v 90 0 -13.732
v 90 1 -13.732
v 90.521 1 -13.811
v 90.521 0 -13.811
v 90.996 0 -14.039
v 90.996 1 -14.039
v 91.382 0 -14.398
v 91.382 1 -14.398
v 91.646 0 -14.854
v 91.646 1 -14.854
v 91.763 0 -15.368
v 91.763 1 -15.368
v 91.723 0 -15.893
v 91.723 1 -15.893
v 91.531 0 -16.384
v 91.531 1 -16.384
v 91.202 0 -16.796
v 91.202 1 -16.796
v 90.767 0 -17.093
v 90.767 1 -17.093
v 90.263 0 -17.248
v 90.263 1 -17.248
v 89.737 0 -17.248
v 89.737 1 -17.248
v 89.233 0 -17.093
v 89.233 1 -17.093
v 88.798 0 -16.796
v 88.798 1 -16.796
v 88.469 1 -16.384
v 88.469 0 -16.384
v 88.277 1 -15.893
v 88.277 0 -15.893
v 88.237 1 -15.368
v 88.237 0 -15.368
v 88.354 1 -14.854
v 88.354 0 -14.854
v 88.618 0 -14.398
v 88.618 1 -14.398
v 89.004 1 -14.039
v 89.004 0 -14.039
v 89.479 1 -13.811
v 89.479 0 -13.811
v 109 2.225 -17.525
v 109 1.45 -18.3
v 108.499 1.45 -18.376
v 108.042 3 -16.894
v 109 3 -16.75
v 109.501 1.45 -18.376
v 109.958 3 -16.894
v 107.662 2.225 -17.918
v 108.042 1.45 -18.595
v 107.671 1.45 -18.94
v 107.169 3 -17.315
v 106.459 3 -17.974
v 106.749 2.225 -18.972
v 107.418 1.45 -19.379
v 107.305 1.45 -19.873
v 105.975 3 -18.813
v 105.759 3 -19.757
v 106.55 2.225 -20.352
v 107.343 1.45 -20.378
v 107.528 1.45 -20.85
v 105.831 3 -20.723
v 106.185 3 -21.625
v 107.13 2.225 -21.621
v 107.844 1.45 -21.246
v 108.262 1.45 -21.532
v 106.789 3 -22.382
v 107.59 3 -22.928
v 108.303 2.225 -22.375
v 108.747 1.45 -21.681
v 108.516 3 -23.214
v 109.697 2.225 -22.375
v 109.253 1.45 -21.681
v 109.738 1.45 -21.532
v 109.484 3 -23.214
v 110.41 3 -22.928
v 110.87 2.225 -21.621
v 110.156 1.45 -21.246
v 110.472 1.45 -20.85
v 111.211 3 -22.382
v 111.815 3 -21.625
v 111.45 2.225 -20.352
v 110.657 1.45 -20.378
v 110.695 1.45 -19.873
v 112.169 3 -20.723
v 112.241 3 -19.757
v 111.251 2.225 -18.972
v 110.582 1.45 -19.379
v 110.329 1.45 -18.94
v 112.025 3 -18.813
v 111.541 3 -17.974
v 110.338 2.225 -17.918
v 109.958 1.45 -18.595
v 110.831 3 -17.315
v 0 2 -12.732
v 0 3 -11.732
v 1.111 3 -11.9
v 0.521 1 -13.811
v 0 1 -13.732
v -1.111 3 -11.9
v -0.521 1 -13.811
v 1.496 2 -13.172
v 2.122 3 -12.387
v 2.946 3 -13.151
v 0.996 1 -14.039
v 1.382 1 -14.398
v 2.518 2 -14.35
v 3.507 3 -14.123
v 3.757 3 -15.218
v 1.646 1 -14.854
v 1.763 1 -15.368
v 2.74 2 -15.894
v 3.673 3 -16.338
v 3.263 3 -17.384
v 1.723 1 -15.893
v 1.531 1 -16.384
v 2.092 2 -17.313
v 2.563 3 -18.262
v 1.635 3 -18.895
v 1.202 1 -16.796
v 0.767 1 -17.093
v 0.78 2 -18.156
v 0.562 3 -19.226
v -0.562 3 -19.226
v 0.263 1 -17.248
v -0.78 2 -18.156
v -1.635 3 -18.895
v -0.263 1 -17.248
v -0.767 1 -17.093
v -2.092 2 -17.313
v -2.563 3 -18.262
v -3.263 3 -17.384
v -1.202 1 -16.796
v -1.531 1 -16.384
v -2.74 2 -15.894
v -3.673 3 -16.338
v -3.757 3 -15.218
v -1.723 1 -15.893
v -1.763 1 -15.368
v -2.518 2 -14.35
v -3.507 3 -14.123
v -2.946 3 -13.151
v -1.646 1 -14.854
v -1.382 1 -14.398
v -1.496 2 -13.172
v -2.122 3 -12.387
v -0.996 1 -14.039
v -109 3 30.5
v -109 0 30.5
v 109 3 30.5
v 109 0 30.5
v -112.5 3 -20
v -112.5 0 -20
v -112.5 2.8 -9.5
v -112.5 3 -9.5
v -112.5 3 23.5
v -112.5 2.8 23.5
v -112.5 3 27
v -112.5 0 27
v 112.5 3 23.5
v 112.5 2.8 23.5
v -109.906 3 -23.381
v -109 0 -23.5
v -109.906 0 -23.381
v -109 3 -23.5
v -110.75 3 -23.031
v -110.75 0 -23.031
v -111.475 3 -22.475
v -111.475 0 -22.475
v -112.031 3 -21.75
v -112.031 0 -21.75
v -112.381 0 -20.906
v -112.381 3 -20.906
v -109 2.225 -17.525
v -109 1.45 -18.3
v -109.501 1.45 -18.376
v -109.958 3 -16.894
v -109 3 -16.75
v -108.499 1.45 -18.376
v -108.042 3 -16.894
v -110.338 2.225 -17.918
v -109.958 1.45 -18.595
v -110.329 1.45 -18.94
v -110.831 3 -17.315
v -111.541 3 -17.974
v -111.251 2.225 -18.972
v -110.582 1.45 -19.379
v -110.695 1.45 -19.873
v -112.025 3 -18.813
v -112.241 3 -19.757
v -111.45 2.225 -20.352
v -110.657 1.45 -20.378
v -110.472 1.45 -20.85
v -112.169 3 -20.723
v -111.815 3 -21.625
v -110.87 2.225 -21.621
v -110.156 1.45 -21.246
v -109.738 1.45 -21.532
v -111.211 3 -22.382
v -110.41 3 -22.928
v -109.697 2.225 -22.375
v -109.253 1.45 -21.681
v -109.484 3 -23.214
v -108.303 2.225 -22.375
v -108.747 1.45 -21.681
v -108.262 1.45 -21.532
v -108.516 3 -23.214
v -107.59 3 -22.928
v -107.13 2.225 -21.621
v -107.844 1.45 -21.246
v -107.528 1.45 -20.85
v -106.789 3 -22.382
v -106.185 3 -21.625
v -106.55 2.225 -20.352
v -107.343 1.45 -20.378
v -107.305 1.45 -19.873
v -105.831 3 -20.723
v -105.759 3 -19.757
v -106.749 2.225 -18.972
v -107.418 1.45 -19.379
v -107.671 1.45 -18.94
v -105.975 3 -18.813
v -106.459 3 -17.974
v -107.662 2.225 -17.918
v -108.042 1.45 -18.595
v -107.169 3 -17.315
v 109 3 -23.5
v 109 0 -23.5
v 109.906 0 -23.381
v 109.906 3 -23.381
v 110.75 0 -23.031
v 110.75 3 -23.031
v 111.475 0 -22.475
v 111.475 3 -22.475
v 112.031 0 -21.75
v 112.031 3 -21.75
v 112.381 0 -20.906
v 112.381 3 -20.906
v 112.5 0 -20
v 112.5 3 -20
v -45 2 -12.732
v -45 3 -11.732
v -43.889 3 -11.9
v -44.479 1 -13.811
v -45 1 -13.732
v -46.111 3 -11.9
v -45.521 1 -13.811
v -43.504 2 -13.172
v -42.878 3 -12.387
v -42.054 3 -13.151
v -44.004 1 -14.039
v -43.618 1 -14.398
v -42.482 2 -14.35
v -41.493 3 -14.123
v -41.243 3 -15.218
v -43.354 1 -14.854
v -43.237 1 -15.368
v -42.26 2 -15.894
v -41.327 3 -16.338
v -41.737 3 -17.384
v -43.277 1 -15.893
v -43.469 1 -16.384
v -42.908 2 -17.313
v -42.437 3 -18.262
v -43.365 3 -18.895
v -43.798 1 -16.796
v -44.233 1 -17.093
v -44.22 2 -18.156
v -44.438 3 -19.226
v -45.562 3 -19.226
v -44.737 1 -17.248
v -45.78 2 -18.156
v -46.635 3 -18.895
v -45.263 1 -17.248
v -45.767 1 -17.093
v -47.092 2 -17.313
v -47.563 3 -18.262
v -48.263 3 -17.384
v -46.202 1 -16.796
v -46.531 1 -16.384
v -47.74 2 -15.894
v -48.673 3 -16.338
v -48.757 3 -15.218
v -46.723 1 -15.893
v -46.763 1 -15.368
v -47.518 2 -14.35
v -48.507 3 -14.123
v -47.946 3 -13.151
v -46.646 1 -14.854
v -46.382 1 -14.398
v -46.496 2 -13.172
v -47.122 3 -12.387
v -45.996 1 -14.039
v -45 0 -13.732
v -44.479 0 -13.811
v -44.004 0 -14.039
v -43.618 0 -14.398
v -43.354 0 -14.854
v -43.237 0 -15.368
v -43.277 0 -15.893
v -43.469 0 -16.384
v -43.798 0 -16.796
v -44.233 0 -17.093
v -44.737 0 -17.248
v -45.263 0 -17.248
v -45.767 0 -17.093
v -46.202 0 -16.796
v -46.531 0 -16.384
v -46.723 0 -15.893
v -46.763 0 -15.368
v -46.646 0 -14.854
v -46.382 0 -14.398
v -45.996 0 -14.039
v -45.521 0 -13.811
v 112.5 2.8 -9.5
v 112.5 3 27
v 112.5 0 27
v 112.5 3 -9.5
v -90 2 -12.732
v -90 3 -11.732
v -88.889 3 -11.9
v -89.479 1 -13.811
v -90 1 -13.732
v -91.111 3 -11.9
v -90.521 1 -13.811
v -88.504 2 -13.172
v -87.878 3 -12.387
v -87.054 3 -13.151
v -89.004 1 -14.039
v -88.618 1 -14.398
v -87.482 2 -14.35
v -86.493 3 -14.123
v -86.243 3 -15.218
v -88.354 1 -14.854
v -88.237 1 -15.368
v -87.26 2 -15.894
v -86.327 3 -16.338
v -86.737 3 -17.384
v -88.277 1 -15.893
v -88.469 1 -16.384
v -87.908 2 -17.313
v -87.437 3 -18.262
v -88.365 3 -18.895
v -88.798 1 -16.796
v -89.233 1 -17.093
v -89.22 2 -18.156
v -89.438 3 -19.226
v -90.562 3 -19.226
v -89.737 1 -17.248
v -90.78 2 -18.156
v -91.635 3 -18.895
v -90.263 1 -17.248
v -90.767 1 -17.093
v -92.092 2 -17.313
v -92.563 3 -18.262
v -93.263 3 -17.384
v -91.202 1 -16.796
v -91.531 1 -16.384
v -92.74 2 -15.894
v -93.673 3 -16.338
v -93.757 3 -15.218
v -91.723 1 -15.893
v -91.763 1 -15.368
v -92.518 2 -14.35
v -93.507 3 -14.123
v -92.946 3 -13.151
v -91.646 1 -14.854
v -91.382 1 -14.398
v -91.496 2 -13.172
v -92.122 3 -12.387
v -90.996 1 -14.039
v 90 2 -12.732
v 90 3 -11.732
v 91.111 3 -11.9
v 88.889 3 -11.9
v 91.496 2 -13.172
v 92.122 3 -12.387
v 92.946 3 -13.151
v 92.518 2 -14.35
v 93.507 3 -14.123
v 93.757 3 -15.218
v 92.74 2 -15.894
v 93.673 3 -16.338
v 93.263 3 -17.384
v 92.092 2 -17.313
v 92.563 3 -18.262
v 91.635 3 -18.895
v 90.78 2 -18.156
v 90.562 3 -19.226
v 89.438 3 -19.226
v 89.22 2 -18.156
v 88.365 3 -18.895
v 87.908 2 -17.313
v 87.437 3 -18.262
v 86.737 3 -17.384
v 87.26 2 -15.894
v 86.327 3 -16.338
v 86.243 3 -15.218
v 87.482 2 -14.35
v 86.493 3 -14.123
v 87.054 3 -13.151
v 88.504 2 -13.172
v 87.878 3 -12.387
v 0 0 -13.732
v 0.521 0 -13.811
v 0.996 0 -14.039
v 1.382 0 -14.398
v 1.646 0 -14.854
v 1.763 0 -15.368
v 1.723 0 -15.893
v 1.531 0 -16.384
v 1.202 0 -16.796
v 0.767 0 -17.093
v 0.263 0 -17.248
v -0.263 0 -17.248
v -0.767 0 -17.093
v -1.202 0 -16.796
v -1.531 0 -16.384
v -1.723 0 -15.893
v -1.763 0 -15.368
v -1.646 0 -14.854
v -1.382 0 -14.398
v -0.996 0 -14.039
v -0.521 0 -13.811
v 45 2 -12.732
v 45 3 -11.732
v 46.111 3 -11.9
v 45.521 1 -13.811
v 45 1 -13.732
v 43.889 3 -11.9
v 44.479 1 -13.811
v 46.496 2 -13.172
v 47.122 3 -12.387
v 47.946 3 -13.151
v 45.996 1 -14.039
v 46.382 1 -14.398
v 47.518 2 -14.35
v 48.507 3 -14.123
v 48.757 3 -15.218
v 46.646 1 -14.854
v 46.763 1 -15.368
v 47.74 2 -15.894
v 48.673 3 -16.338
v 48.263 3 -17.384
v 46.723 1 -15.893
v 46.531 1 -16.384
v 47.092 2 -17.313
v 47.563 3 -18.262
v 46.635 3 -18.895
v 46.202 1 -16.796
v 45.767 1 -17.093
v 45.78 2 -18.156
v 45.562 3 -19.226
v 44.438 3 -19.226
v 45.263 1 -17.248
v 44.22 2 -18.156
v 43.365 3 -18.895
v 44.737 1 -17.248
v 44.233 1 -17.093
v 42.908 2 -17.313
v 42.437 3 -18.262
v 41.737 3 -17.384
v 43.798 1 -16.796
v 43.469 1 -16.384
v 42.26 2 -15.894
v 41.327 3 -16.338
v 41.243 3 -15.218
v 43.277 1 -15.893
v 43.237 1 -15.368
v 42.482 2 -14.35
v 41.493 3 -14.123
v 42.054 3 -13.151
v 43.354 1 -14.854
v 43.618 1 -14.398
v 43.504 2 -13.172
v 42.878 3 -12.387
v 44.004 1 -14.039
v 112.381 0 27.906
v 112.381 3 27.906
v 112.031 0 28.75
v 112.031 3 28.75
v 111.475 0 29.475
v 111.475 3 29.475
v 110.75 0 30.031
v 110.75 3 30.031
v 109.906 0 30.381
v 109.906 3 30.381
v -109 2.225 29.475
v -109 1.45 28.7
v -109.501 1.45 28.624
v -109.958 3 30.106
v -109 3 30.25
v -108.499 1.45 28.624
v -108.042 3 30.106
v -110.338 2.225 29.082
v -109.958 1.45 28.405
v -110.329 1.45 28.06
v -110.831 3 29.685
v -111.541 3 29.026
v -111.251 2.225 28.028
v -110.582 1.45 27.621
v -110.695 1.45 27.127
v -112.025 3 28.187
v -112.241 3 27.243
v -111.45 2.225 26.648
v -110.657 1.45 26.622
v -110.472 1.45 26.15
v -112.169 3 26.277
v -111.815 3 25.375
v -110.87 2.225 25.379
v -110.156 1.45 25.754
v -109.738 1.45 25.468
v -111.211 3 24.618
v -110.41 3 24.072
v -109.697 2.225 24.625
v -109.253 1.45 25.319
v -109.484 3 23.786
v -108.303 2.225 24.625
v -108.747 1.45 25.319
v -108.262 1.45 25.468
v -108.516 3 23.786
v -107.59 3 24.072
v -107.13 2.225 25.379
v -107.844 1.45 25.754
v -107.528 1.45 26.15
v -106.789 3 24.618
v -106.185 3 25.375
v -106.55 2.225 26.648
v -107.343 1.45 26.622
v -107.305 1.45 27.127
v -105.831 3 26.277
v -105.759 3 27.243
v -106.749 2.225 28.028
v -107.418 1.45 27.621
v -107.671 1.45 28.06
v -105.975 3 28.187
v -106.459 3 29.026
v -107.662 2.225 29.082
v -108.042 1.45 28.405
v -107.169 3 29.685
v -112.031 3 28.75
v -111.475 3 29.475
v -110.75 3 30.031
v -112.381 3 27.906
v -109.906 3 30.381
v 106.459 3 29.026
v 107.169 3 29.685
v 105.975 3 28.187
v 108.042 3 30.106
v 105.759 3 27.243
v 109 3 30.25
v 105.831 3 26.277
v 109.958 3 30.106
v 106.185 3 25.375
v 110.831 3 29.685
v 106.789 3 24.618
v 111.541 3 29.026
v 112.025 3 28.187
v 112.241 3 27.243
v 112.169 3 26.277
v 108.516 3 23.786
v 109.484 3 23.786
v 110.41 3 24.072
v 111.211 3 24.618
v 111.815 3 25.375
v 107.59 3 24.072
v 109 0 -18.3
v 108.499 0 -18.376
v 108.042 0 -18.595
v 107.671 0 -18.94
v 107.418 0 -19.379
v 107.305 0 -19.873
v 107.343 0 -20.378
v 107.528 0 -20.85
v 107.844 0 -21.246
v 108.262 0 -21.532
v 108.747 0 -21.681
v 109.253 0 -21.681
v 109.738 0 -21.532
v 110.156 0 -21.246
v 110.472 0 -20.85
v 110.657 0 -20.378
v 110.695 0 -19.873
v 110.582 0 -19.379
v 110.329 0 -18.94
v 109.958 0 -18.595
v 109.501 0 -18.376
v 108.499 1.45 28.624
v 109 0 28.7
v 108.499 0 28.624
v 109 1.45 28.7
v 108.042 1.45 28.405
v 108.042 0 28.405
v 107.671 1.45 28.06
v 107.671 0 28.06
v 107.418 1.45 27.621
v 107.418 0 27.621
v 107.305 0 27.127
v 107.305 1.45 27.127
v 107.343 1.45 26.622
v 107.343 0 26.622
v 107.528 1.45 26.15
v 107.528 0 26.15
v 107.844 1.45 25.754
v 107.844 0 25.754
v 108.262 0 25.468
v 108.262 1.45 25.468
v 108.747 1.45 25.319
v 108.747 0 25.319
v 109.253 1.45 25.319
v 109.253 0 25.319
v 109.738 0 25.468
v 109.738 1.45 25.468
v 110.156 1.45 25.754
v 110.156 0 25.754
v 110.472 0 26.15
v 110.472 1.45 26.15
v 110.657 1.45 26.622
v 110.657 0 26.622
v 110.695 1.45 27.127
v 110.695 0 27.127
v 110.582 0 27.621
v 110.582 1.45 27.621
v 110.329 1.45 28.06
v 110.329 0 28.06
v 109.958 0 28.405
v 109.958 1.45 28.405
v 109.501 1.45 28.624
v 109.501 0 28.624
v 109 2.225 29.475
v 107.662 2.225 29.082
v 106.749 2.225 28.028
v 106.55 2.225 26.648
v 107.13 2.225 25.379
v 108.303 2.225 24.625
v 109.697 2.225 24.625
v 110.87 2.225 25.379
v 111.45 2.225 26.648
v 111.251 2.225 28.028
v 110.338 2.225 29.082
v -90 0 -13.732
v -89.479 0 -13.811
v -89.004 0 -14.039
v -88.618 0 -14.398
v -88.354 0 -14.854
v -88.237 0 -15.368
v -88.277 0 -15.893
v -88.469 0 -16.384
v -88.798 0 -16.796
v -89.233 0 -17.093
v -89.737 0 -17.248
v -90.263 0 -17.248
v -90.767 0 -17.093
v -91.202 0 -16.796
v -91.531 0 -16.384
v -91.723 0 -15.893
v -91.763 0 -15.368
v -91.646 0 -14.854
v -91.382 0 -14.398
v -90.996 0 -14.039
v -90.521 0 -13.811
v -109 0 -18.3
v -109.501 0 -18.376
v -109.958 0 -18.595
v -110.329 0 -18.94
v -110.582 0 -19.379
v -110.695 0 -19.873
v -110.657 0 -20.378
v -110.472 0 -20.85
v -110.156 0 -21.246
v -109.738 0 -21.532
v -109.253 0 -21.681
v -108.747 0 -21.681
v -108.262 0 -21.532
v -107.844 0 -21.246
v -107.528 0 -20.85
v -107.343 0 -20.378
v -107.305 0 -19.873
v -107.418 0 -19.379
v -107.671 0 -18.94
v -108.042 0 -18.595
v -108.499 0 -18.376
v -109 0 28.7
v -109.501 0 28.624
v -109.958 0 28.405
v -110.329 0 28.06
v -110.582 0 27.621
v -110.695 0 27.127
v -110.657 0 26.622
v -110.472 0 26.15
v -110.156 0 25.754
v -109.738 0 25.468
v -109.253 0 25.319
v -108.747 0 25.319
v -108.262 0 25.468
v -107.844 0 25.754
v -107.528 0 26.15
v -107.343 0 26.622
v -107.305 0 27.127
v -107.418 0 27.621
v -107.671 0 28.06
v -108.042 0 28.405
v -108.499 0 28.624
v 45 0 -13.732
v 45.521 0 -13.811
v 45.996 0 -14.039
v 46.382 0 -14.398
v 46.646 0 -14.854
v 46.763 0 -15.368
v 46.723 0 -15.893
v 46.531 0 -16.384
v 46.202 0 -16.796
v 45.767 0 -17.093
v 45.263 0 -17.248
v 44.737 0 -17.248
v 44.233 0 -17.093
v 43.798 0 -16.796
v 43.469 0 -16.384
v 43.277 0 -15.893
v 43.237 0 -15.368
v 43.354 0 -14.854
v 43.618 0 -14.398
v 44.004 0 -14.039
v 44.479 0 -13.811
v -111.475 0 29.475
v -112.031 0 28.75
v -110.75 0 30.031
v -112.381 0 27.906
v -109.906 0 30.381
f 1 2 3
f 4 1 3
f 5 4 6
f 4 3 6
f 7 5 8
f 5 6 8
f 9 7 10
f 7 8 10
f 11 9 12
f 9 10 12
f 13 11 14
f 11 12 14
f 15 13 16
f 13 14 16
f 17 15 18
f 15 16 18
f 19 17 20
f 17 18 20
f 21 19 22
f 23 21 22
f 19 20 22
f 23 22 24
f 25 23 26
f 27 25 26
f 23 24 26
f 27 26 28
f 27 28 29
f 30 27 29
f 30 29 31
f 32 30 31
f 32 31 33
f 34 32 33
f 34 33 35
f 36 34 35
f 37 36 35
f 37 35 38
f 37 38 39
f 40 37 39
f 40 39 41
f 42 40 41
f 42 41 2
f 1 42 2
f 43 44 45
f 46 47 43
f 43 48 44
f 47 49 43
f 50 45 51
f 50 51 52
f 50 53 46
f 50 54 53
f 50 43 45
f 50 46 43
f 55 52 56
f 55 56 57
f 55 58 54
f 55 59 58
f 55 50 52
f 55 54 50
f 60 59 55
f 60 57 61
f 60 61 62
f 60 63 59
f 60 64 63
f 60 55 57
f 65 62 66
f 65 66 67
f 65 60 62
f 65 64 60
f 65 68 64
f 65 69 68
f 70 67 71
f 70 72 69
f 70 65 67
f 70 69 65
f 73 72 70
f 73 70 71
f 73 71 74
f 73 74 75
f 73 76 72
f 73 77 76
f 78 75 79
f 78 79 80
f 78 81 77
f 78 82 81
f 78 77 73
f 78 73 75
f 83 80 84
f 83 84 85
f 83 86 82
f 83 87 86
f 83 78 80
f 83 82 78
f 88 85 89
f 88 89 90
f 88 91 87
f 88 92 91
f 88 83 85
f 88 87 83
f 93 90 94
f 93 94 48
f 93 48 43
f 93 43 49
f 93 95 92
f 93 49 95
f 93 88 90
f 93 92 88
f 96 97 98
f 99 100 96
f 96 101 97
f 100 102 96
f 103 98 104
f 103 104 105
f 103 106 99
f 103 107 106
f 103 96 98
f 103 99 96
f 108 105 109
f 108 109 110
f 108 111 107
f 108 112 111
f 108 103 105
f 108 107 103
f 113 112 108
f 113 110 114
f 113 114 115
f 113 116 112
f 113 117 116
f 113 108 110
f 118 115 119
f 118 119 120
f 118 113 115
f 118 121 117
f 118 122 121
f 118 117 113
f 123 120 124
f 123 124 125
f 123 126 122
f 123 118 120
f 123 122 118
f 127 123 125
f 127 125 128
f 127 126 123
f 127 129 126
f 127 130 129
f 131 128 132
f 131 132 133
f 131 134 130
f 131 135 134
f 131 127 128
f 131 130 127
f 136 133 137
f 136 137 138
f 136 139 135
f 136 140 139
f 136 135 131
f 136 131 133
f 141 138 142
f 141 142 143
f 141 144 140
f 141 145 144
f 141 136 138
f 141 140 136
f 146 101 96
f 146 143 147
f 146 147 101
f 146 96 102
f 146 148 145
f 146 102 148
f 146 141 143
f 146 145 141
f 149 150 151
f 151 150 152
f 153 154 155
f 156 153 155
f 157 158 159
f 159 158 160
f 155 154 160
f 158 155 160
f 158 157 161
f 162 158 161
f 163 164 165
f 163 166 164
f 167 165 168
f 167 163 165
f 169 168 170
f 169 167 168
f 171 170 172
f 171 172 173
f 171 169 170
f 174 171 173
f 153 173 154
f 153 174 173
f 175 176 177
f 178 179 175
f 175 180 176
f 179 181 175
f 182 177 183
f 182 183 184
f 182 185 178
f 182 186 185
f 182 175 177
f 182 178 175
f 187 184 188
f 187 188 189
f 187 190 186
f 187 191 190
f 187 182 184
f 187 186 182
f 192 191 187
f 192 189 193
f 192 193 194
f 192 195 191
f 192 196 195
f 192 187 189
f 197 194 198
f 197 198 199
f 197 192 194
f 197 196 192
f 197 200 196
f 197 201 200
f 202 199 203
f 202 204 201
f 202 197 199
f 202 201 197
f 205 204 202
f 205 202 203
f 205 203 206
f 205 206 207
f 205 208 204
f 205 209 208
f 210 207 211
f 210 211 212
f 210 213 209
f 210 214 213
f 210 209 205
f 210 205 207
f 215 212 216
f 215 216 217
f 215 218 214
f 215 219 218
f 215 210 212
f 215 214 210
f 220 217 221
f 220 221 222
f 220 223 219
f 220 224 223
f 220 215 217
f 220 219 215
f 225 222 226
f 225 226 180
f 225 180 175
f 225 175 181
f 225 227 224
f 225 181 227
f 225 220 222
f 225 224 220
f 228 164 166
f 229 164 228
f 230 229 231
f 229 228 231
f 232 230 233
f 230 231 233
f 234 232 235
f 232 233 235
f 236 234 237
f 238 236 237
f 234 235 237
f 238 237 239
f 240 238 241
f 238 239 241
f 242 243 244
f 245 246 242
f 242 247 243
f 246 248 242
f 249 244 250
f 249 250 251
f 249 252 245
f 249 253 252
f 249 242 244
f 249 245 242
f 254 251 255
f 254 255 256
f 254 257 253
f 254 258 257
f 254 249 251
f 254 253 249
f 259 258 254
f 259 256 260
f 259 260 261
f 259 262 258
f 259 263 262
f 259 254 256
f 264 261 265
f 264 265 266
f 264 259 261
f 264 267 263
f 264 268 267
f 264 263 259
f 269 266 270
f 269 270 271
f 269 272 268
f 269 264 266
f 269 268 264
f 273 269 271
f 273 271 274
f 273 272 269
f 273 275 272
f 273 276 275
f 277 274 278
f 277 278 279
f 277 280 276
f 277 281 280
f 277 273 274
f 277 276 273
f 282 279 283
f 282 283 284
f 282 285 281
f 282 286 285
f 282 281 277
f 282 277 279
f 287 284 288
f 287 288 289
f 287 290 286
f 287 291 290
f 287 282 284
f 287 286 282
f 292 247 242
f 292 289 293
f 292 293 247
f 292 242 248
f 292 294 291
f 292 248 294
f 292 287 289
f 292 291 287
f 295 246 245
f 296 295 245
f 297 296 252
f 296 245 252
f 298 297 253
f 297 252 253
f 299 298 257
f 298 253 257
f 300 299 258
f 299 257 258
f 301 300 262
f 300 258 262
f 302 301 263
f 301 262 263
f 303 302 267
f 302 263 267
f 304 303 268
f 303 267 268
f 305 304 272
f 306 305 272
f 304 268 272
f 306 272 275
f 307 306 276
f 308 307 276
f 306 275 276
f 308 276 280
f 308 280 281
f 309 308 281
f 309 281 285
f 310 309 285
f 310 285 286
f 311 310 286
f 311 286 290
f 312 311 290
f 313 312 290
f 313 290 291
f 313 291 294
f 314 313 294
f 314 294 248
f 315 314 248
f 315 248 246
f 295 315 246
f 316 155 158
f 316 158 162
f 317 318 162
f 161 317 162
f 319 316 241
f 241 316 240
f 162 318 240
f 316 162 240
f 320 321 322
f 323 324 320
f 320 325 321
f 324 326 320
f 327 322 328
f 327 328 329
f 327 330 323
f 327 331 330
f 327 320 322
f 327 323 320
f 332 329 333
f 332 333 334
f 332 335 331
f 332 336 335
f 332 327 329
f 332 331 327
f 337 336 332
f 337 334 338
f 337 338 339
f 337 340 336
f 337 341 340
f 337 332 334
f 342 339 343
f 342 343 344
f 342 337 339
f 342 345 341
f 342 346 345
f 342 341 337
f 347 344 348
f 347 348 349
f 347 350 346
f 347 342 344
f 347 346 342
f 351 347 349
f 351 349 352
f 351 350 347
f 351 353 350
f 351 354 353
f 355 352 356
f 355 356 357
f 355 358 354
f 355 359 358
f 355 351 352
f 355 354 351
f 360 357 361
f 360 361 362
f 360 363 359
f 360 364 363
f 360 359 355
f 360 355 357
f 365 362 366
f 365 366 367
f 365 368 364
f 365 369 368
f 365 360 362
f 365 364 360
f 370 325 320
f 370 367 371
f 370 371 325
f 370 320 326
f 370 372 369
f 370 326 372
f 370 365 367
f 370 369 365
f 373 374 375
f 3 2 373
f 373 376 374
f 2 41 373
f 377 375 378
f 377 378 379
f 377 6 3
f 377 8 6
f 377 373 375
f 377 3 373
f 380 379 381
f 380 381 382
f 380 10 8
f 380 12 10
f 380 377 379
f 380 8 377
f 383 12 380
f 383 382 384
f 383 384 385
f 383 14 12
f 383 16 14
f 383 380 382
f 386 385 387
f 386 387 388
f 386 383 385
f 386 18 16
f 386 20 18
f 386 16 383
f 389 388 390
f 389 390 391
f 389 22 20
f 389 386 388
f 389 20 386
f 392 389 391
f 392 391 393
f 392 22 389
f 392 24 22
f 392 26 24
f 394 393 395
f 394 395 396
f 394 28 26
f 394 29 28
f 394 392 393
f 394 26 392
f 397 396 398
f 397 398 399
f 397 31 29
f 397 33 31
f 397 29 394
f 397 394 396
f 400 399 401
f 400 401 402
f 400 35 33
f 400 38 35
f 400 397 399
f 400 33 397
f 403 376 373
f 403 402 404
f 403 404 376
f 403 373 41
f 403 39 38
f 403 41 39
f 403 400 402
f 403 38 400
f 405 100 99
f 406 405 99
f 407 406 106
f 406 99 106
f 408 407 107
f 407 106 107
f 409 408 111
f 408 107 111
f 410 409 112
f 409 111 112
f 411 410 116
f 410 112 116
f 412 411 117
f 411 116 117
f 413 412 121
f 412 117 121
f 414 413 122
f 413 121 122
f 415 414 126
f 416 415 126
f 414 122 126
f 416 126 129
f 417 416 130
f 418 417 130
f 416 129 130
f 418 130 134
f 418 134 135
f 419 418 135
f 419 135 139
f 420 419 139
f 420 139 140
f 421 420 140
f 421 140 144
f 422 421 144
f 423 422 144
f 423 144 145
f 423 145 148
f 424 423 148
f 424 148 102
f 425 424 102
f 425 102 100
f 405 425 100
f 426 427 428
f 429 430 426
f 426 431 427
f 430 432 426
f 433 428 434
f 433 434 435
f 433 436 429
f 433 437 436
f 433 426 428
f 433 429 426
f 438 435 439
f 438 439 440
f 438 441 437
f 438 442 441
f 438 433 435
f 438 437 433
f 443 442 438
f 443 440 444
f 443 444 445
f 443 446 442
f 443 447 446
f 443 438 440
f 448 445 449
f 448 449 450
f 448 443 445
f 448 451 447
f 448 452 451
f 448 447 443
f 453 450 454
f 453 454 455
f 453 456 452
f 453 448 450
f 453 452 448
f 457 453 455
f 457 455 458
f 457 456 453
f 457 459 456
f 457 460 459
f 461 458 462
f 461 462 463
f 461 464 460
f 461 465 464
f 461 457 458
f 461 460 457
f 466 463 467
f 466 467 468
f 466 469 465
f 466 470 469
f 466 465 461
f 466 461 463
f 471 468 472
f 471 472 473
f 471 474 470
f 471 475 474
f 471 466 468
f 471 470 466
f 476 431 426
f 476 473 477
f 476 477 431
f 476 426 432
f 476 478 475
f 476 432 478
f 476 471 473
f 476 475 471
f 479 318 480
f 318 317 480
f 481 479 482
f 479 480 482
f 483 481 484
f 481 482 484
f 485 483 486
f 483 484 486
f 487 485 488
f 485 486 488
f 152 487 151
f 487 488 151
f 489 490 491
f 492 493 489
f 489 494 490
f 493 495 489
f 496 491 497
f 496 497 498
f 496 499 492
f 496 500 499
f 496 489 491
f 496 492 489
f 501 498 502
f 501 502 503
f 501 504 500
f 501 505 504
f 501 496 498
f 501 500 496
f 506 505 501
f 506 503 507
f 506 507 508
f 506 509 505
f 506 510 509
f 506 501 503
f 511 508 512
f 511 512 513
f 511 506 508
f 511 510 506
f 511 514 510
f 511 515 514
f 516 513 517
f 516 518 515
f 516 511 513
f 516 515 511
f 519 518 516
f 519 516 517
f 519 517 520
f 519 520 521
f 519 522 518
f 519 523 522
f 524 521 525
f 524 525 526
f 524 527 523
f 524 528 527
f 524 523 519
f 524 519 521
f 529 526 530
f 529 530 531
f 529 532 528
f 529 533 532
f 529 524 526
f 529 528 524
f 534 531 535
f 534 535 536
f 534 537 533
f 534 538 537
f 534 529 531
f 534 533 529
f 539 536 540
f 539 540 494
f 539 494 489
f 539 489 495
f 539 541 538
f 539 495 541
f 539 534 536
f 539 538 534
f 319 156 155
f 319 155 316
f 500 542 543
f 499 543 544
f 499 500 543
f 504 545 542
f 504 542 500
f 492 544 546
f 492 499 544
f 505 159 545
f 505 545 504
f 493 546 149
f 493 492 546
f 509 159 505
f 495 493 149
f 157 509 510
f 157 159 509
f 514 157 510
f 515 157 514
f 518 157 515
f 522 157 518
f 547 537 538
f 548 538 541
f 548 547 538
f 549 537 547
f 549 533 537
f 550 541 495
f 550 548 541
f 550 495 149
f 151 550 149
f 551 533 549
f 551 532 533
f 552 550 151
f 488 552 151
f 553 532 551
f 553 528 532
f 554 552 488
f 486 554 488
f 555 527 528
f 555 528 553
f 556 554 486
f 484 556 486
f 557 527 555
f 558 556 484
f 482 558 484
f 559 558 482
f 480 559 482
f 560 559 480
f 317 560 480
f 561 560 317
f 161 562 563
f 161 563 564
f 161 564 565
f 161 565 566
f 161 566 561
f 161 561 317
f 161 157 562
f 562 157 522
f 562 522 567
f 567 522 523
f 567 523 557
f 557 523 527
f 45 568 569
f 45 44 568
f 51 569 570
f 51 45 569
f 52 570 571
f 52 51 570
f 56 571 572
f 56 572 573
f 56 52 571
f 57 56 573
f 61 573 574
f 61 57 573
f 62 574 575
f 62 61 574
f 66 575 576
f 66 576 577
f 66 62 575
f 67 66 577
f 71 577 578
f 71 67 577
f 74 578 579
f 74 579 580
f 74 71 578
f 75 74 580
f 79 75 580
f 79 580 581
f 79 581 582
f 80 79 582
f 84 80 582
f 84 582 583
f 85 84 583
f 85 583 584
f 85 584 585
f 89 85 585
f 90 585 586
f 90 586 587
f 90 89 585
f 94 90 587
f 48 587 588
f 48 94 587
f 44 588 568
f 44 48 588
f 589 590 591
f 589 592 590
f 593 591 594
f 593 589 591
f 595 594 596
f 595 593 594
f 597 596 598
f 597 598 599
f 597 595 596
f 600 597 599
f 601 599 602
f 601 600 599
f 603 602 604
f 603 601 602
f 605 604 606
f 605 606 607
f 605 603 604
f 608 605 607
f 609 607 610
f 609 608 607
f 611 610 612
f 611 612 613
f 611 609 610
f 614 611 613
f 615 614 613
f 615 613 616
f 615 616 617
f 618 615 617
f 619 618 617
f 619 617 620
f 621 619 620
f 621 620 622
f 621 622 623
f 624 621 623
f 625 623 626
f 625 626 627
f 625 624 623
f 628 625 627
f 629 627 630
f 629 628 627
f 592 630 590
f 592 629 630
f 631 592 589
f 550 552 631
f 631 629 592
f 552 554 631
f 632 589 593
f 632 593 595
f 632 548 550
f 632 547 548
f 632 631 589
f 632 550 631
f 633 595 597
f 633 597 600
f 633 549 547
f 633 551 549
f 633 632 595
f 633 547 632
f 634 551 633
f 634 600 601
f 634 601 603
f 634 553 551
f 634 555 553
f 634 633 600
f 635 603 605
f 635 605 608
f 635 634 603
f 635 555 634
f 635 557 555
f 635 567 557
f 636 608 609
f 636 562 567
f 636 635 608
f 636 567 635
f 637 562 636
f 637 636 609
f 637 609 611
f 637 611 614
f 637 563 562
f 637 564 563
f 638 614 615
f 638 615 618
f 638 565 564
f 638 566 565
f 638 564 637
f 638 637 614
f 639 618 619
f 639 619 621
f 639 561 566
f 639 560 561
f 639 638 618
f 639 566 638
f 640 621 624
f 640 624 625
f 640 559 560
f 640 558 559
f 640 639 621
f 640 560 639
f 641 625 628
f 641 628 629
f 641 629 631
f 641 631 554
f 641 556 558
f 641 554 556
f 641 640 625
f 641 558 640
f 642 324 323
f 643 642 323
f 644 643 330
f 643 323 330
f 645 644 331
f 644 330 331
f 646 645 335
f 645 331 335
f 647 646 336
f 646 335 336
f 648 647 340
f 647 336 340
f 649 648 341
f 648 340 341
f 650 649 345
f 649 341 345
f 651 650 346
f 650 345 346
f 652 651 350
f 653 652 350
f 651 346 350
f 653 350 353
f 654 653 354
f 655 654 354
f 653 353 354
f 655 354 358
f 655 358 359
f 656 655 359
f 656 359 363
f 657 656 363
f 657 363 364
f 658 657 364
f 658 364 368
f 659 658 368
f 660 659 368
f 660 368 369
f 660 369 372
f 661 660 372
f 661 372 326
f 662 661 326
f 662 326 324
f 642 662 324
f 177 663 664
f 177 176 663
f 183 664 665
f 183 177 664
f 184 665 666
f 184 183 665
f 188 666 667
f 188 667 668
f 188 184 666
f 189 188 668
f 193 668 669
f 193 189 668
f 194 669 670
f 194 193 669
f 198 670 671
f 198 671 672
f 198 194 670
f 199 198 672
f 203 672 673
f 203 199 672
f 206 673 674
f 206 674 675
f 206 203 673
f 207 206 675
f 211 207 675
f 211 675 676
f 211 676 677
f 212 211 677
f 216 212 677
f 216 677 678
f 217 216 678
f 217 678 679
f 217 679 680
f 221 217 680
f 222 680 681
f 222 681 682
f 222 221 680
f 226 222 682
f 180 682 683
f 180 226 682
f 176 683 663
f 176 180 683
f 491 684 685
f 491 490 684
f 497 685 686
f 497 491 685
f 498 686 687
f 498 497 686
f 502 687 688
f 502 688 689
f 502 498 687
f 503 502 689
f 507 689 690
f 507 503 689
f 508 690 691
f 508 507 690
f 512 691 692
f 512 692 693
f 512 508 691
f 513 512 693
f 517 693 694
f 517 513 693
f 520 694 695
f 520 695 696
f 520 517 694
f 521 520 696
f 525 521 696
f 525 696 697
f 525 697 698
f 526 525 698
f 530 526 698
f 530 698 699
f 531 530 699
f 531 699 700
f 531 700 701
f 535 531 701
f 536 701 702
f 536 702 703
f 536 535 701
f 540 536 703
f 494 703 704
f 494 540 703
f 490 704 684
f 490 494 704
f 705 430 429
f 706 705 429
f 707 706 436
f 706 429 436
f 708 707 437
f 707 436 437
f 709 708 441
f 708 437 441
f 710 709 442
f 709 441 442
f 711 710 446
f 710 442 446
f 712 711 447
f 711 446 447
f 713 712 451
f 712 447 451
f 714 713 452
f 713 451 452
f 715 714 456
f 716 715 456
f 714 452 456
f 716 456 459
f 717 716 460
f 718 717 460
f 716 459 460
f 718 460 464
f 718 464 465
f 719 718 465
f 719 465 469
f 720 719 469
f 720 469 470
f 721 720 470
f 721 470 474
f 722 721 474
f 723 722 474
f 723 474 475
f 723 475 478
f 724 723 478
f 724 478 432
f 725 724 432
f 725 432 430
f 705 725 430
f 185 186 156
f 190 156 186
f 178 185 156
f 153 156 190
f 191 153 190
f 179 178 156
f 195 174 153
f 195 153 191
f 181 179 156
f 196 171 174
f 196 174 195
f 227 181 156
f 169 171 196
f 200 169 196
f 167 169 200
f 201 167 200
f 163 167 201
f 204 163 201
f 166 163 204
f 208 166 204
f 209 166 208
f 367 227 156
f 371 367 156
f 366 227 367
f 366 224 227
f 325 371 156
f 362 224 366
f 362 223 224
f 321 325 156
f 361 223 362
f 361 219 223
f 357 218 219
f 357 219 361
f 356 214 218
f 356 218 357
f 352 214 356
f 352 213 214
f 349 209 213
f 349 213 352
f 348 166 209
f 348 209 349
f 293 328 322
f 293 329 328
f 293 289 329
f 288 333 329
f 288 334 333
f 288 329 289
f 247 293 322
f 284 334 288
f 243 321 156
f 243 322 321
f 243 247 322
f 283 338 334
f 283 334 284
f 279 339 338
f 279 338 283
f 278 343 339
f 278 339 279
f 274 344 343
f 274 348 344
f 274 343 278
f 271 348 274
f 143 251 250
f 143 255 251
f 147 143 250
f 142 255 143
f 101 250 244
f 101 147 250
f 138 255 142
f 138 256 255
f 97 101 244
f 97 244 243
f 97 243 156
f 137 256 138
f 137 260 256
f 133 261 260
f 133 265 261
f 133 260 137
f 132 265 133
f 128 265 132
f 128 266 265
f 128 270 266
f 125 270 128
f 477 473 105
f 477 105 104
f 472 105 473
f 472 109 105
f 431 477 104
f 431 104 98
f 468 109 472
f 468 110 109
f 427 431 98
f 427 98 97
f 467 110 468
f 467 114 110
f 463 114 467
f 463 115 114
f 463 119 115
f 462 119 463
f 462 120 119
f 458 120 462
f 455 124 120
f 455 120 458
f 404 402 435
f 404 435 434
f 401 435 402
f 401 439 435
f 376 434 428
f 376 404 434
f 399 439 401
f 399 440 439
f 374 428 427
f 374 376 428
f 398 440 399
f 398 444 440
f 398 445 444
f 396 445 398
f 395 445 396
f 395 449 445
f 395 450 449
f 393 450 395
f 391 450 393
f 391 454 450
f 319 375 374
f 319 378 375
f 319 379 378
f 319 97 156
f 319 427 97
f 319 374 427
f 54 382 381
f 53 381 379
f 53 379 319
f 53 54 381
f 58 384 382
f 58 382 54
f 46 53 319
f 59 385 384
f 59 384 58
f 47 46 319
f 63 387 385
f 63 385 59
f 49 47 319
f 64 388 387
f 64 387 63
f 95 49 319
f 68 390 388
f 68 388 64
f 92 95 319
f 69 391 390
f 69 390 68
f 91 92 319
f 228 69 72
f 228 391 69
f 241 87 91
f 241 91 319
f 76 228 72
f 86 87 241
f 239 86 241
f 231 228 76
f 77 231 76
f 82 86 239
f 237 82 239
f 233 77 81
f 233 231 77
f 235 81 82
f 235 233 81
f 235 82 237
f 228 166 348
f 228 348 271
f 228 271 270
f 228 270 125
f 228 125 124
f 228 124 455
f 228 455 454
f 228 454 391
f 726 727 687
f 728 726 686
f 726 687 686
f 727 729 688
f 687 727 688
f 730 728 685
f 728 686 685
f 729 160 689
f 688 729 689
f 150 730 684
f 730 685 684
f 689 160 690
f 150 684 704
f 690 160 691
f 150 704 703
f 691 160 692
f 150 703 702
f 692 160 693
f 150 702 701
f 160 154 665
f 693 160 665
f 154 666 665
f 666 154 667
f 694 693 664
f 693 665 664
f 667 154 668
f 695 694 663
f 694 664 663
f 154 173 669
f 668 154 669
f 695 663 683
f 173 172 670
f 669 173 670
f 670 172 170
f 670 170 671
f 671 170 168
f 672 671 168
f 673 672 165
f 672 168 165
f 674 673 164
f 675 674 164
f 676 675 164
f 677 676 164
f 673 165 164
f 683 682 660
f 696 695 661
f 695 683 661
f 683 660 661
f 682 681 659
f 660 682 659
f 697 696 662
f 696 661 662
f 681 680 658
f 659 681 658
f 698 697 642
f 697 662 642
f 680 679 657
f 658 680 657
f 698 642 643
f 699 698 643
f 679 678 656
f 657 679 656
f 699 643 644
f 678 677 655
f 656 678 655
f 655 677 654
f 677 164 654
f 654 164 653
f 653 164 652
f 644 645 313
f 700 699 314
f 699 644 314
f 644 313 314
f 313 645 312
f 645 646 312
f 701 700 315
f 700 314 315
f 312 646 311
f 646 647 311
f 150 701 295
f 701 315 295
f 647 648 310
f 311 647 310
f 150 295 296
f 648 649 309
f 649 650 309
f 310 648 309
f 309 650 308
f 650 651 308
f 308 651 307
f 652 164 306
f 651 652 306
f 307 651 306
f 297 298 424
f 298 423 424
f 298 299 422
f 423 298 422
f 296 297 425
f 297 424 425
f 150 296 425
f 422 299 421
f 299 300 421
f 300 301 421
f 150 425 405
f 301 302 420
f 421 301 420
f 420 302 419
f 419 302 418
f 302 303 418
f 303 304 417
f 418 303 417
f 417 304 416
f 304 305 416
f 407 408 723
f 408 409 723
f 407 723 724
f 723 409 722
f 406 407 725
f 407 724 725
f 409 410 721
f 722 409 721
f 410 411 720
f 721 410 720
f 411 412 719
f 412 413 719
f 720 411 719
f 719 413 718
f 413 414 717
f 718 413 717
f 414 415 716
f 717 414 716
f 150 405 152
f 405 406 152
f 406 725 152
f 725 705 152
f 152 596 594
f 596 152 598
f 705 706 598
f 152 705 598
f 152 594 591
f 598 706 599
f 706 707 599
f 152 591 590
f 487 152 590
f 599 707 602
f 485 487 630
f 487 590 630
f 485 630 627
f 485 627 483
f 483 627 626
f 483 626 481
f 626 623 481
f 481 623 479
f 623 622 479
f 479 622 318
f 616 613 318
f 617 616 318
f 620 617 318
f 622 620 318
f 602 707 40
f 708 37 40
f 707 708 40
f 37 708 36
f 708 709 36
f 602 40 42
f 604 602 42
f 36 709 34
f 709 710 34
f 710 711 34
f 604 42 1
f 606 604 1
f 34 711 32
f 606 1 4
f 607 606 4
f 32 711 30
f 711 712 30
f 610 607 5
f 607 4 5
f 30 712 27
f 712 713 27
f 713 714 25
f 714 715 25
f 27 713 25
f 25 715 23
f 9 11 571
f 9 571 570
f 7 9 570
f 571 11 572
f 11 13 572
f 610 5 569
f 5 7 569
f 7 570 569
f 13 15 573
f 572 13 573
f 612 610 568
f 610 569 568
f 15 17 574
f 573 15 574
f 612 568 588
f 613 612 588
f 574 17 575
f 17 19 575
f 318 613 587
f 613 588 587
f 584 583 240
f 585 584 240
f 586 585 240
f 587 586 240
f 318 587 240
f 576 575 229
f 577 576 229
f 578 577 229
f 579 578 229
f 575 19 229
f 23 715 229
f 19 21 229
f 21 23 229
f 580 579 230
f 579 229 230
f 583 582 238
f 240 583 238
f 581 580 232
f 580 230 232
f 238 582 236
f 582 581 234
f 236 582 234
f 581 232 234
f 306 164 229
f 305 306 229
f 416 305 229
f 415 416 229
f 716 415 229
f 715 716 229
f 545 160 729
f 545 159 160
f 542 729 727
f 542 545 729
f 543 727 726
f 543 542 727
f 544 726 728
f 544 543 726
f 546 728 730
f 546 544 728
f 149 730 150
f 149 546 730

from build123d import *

# Parameters (mm, degrees)
SKETCH1_W                                    = 225
SKETCH1_H                                    = 47
SKETCH1_H_2                                  = 7
BOSS_EXTRUDE1_DEPTH                          = 3
SKETCH3_R                                    = 1.767766953
CUT_EXTRUDE1_DEPTH                           = 117.59974271
CHAMFER2_SIZE                                = 2
SKETCH2_W                                    = 225
SKETCH2_H                                    = 33
SKETCH2_R                                    = 15
CUT_EXTRUDE2_DEPTH                           = 0.2
FILLET1_R                                    = 3.5
CSK_FOR_M3_COUNTERSUNK_FLAT_HEAD_SCR_2_COUNT = 2
CSK_FOR_M3_COUNTERSUNK_FLAT_HEAD_SCR_2_PITCH = 47
CSK_FOR_M3_COUNTERSUNK_FLAT_HEAD_SCR_3_COUNT = 2
CSK_FOR_M3_COUNTERSUNK_FLAT_HEAD_SCR_3_PITCH = 223.00896843
CSK_FOR_M3_COUNTERSUNK_FLAT_HEAD_SCR_4_COUNT = 2
CSK_FOR_M3_COUNTERSUNK_FLAT_HEAD_SCR_4_PITCH = 218


with BuildPart() as part:
    # Sketch1 → Boss-Extrude1 (new body)
    with BuildSketch(Plane(origin=(0, 0, 0), x_dir=(1, 0, 0), z_dir=(0, 1, 0))):
        Rectangle(SKETCH1_W, SKETCH1_H)
        with Locations((0, -27)):
            Rectangle(SKETCH1_W, SKETCH1_H_2)
    extrude(amount=BOSS_EXTRUDE1_DEPTH)

    # Sketch3 → Cut-Extrude1 (cut, through all)
    with BuildSketch(Plane(origin=(0, 3, 0), x_dir=(1, 0, 0), z_dir=(0, 1, 0))):
        with Locations(Location((0, 15.5, 0), (0, 0, 270))):
            Circle(SKETCH3_R)
        with Locations(Location((45, 15.5, 0), (0, 0, 270))):
            Circle(SKETCH3_R)
        with Locations(Location((90, 15.5, 0), (0, 0, 270))):
            Circle(SKETCH3_R)
        with Locations(Location((-45, 15.5, 0), (0, 0, 270))):
            Circle(SKETCH3_R)
        with Locations(Location((-90, 15.5, 0), (0, 0, 270))):
            Circle(SKETCH3_R)
    extrude(amount=-CUT_EXTRUDE1_DEPTH, mode=Mode.SUBTRACT)

    # Chamfer2
    chamfer2_edges = [part.edges().sort_by_distance(p)[0] for p in [
        (-90, 3, -17.267766953),
        (-45, 3, -17.267766953),
        (90, 3, -17.267766953),
        (45, 3, -17.267766953),
        (0, 3, -17.267766953),
    ]]
    chamfer(chamfer2_edges, length=CHAMFER2_SIZE)

    # Sketch2 → Cut-Extrude2 (cut)
    # profile 1 of 6: a face of its own
    with BuildSketch(Plane(origin=(0, 3, 0), x_dir=(1, 0, 0), z_dir=(0, 1, 0))):
        with Locations((0, -7)):
            Rectangle(SKETCH2_W, SKETCH2_H)
        with Locations((-90, -7)):
            Circle(SKETCH2_R, mode=Mode.SUBTRACT)
        with Locations((-45, -7)):
            Circle(SKETCH2_R, mode=Mode.SUBTRACT)
        with Locations((0, -7)):
            Circle(SKETCH2_R, mode=Mode.SUBTRACT)
        with Locations((45, -7)):
            Circle(SKETCH2_R, mode=Mode.SUBTRACT)
        with Locations((90, -7)):
            Circle(SKETCH2_R, mode=Mode.SUBTRACT)
    # profile 2 of 6: a face of its own
    with BuildSketch(Plane(origin=(0, 3, 0), x_dir=(1, 0, 0), z_dir=(0, 1, 0))):
        with Locations((-90, -7)):
            Circle(SKETCH2_R)
    # profile 3 of 6: a face of its own
    with BuildSketch(Plane(origin=(0, 3, 0), x_dir=(1, 0, 0), z_dir=(0, 1, 0))):
        with Locations((-45, -7)):
            Circle(SKETCH2_R)
    # profile 4 of 6: a face of its own
    with BuildSketch(Plane(origin=(0, 3, 0), x_dir=(1, 0, 0), z_dir=(0, 1, 0))):
        with Locations((0, -7)):
            Circle(SKETCH2_R)
    # profile 5 of 6: a face of its own
    with BuildSketch(Plane(origin=(0, 3, 0), x_dir=(1, 0, 0), z_dir=(0, 1, 0))):
        with Locations((45, -7)):
            Circle(SKETCH2_R)
    # profile 6 of 6: a face of its own
    with BuildSketch(Plane(origin=(0, 3, 0), x_dir=(1, 0, 0), z_dir=(0, 1, 0))):
        with Locations((90, -7)):
            Circle(SKETCH2_R)
    extrude(amount=-CUT_EXTRUDE2_DEPTH, mode=Mode.SUBTRACT)

    # Fillet1
    fillet1_edges = [part.edges().sort_by_distance(p)[0] for p in [
        (112.5, 1.5, 30.5),
        (-112.5, 1.5, 30.5),
        (-112.5, 1.5, -23.5),
        (112.5, 1.5, -23.5),
    ]]
    fillet(fillet1_edges, radius=FILLET1_R)

    # Sketch5 → CSK for M3 Countersunk Flat Head Screw1 (revolve, cut)
    with BuildSketch(Plane(origin=(109, 3, -20), x_dir=(0, 0, 1), z_dir=(1, 0, 0))):
        Polygon((0, 0), (0, 3), (1.7, 3), (1.7, 1.55), (3.25, 0), align=None)
    csk_for_m3_countersunk_flat_head_screw1 = revolve(axis=Axis((109, 9.35, -20), (0, -1, 0)), mode=Mode.SUBTRACT)

    # CSK for M3 Countersunk Flat Head Scr 2: CSK for M3 Countersunk Flat Head Screw1 ×2
    with Locations(*[(0, 0, i * CSK_FOR_M3_COUNTERSUNK_FLAT_HEAD_SCR_2_PITCH) for i in range(1, CSK_FOR_M3_COUNTERSUNK_FLAT_HEAD_SCR_2_COUNT)]):
        add(csk_for_m3_countersunk_flat_head_screw1, mode=Mode.SUBTRACT)

    # CSK for M3 Countersunk Flat Head Scr 3: CSK for M3 Countersunk Flat Head Screw1 ×2
    with Locations(*[Vector(-0.977539161474997, 0, 0.21075385591433424) * (i * CSK_FOR_M3_COUNTERSUNK_FLAT_HEAD_SCR_3_PITCH) for i in range(1, CSK_FOR_M3_COUNTERSUNK_FLAT_HEAD_SCR_3_COUNT)]):
        add(csk_for_m3_countersunk_flat_head_screw1, mode=Mode.SUBTRACT)

    # CSK for M3 Countersunk Flat Head Scr 4: CSK for M3 Countersunk Flat Head Screw1 ×2
    with Locations(*[(-i * CSK_FOR_M3_COUNTERSUNK_FLAT_HEAD_SCR_4_PITCH, 0, 0) for i in range(1, CSK_FOR_M3_COUNTERSUNK_FLAT_HEAD_SCR_4_COUNT)]):
        add(csk_for_m3_countersunk_flat_head_screw1, mode=Mode.SUBTRACT)


solid = part.part
